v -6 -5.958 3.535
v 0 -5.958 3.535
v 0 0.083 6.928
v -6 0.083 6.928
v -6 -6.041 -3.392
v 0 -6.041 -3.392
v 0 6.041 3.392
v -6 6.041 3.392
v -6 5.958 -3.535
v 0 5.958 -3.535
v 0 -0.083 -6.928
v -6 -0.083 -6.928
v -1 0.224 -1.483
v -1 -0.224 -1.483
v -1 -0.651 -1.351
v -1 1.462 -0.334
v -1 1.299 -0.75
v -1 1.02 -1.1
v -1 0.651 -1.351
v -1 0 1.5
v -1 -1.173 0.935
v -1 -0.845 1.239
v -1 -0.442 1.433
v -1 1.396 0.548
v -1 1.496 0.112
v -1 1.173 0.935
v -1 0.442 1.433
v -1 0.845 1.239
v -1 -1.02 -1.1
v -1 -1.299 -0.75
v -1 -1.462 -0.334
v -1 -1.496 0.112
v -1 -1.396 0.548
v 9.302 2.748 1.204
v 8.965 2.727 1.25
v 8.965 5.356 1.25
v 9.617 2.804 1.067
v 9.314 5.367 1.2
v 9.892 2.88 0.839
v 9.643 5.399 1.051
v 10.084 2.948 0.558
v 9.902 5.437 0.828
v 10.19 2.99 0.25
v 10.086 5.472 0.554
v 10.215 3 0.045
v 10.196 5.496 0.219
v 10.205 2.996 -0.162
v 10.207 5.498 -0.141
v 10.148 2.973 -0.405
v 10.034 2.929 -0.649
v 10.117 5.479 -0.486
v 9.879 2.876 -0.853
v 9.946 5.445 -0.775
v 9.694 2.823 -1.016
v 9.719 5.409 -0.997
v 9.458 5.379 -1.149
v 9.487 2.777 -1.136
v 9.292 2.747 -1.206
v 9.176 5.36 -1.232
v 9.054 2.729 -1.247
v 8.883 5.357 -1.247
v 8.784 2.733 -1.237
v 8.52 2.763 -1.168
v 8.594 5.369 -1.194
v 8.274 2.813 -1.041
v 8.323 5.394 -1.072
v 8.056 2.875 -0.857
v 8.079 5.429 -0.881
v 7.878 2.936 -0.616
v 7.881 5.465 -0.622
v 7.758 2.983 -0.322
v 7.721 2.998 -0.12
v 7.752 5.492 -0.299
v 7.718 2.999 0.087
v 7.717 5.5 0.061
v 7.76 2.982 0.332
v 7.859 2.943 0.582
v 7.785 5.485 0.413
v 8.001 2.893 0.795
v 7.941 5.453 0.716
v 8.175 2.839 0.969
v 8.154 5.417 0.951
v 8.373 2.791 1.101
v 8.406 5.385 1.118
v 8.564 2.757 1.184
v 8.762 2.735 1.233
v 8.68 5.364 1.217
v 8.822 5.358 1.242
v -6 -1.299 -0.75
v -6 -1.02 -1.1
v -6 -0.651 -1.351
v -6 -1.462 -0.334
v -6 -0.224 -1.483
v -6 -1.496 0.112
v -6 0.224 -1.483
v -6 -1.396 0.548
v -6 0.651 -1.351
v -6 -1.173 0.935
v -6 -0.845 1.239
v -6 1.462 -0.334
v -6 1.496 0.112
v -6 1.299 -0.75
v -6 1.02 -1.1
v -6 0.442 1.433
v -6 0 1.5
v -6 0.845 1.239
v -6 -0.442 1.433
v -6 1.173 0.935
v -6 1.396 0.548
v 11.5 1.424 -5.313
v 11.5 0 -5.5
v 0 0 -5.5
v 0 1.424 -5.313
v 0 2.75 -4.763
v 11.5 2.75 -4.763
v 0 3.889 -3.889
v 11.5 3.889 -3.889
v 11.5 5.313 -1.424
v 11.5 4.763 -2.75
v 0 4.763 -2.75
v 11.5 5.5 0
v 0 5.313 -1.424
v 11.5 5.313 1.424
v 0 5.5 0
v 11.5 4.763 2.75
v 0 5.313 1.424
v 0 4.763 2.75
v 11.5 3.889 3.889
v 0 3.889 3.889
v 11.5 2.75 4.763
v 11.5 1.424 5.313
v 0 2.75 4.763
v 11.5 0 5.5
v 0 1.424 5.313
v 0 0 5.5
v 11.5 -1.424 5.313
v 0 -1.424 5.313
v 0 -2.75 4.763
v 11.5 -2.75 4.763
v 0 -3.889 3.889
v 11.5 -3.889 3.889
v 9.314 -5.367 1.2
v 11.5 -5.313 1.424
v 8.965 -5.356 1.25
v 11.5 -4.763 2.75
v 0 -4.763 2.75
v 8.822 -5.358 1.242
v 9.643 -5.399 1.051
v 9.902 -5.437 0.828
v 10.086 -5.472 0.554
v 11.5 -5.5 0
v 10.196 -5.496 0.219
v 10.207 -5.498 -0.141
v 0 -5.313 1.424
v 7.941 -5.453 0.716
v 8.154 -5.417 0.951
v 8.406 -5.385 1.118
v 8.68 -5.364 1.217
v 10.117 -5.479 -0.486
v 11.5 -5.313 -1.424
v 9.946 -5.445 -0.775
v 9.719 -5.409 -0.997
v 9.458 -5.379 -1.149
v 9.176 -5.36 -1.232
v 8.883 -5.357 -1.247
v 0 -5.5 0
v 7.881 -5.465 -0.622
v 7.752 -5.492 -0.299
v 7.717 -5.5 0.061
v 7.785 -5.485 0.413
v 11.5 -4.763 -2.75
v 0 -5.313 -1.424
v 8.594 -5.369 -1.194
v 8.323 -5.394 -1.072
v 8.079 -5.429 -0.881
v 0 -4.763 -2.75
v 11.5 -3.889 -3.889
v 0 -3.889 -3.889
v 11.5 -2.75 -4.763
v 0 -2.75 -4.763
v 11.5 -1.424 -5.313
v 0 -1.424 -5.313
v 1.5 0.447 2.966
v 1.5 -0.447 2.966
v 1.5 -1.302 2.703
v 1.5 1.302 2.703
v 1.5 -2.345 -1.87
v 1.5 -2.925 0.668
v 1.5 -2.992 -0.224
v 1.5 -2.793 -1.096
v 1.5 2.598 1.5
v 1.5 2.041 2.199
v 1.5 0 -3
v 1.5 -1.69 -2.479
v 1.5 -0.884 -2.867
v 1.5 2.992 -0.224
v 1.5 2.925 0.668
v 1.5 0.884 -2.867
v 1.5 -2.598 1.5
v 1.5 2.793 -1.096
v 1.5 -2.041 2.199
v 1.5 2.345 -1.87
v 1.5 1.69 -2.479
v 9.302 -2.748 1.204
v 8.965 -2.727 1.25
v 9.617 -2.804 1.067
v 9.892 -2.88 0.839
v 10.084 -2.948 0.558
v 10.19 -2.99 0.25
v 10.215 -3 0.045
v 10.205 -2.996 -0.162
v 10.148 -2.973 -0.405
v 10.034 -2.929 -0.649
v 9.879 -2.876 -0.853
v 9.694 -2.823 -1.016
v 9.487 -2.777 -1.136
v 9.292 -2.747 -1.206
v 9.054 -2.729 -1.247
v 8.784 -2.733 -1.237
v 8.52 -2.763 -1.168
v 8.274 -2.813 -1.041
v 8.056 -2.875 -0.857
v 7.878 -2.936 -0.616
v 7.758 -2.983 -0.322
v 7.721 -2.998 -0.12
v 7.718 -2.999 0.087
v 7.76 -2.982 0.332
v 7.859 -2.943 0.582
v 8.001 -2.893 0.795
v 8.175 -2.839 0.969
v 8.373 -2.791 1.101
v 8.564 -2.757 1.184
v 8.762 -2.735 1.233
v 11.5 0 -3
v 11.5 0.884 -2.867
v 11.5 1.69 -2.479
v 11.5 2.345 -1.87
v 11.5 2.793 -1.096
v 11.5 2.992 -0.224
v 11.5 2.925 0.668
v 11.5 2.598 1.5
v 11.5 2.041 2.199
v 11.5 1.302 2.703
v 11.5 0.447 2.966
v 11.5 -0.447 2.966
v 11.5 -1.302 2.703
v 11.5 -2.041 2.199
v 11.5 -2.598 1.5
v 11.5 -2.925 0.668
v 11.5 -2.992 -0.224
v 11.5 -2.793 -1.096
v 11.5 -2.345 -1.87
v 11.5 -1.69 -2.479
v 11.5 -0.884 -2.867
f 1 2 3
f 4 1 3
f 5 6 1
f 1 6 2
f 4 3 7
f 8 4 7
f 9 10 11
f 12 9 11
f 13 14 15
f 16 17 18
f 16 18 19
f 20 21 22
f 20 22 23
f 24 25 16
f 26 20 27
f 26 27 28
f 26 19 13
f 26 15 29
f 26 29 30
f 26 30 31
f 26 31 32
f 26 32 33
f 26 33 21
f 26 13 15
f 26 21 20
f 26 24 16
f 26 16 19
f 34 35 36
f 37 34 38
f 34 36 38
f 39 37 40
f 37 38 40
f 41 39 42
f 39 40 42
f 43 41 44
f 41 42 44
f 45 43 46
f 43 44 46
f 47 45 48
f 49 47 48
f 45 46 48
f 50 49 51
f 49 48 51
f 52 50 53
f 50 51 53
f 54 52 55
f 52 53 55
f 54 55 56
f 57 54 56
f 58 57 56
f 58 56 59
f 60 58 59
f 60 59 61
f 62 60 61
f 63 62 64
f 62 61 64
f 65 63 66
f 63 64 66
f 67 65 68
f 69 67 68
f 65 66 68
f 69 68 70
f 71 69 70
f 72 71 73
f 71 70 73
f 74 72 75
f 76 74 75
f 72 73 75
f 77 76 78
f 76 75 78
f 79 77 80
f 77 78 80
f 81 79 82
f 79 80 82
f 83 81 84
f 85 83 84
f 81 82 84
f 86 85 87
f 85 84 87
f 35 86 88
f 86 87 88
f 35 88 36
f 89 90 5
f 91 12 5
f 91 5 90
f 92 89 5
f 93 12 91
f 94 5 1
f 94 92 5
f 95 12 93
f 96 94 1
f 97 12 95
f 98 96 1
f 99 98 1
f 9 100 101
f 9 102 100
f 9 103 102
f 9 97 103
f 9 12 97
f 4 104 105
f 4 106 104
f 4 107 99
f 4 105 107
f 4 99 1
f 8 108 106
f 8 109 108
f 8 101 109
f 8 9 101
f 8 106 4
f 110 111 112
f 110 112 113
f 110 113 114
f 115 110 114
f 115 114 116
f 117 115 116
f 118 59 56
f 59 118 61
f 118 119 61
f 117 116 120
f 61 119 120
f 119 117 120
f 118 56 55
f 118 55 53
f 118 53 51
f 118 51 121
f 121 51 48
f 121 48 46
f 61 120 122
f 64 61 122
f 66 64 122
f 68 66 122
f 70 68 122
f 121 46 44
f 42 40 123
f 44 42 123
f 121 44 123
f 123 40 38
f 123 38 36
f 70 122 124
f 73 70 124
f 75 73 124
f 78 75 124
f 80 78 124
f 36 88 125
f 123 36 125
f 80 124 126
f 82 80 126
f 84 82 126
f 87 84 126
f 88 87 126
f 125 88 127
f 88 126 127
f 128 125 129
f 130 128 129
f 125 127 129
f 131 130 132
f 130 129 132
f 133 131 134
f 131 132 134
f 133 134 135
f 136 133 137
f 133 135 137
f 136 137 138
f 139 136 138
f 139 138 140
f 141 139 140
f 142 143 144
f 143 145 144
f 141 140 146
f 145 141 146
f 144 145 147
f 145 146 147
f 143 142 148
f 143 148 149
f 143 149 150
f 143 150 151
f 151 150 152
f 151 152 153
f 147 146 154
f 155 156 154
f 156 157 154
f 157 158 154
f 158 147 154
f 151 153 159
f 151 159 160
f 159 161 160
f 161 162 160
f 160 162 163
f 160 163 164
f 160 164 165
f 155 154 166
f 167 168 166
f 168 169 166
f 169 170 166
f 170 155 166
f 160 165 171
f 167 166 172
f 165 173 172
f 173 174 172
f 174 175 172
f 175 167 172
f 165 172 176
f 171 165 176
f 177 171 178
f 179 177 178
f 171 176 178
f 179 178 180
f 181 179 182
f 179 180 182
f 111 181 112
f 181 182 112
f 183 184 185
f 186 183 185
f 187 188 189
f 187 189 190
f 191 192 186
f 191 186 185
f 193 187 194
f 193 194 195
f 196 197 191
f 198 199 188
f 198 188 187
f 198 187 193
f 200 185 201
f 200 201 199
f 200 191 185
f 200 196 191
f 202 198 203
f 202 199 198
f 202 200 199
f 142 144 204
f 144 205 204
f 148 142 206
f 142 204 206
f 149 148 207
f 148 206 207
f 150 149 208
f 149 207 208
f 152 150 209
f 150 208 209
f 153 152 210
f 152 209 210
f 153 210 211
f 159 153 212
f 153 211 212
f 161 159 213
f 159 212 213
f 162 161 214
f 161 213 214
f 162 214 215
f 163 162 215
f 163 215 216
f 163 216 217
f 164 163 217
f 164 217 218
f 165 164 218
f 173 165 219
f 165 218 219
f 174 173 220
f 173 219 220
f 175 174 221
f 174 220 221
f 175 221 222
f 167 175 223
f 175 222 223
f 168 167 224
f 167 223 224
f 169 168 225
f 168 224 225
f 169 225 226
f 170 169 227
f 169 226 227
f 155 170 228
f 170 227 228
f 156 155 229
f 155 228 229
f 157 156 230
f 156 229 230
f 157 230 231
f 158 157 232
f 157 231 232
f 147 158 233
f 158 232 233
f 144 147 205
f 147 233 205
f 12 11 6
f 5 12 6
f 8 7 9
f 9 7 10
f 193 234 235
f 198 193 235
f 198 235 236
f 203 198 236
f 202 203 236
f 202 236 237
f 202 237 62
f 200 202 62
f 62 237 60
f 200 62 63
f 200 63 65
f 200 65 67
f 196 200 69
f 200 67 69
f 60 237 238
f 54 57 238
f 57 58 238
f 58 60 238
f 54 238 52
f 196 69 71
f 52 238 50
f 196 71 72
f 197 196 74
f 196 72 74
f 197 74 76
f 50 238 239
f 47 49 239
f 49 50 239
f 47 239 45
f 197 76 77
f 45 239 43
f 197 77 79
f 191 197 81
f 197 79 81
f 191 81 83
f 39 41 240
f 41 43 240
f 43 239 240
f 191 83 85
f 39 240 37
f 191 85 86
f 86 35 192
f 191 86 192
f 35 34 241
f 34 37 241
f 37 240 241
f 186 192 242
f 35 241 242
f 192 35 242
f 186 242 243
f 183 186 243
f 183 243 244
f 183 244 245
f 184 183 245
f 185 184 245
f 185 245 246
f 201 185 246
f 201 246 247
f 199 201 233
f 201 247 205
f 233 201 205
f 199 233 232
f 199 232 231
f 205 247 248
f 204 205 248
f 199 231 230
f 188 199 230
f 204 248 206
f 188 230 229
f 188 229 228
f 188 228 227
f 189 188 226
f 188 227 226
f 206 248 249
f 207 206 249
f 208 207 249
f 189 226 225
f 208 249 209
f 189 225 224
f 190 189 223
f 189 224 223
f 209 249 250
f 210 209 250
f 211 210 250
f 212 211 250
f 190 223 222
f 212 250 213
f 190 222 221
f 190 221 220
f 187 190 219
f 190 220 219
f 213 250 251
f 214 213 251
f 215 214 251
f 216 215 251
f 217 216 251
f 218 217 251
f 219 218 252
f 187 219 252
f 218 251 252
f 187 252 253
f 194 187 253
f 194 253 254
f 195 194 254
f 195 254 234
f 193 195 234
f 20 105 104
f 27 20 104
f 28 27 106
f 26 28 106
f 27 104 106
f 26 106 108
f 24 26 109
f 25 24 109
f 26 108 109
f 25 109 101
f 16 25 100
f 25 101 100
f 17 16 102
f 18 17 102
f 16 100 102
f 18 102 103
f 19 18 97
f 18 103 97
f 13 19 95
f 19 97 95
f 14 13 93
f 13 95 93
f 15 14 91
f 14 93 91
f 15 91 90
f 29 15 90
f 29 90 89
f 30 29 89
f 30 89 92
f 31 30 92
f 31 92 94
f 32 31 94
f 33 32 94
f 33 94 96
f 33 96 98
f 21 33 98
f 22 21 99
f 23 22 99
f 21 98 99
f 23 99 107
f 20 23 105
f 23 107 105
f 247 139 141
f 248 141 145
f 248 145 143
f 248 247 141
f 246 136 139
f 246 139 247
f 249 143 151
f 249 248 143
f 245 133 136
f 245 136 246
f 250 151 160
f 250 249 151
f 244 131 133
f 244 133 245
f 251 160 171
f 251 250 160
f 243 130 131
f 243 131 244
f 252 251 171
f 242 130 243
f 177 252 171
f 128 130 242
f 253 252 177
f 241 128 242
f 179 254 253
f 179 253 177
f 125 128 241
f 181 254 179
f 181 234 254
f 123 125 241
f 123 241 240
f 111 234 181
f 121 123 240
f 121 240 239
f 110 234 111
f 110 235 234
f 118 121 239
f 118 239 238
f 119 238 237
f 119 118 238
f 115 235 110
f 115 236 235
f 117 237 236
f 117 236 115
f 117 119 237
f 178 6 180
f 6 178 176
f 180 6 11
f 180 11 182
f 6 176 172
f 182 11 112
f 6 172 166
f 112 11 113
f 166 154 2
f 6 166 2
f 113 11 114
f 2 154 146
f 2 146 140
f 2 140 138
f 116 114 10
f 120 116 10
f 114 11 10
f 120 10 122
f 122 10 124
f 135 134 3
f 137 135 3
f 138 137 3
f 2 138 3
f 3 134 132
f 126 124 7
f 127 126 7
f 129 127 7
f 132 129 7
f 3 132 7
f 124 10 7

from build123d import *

# Parameters (mm, degrees)
SKETCH1_R           = 5.5
BOSS_EXTRUDE1_DEPTH = 11.5
BOSS_EXTRUDE2_DEPTH = 6
SKETCH3_R           = 3
CUT_EXTRUDE1_DEPTH  = 10
SKETCH4_R           = 1.25
CUT_EXTRUDE4_DEPTH  = 10
SKETCH5_R           = 1.5
CUT_EXTRUDE5_DEPTH  = 5


with BuildPart() as part:
    # Sketch1 → Boss-Extrude1 (new body)
    with BuildSketch(Plane(origin=(0, 0, 0), x_dir=(0, 0, -1), z_dir=(1, 0, 0))):
        Circle(SKETCH1_R)
    extrude(amount=BOSS_EXTRUDE1_DEPTH)

    # Sketch2 → Boss-Extrude2 (add)
    with BuildSketch(Plane.ZY):
        Polygon((3.392309556, 6.040880389), (-3.535401101, 5.958266447), (-6.927710656, -0.082613942), (-3.392309556, -6.040880389), (3.535401101, -5.958266447), (6.927710656, 0.082613942), align=None)
    extrude(amount=BOSS_EXTRUDE2_DEPTH)

    # Sketch3 → Cut-Extrude1 (cut)
    with BuildSketch(Plane(origin=(11.5, 0, 0), x_dir=(0, 0, -1), z_dir=(1, 0, 0))):
        Circle(SKETCH3_R)
    extrude(amount=-CUT_EXTRUDE1_DEPTH, mode=Mode.SUBTRACT)

    # Sketch4 → Cut-Extrude4 (cut, symmetric)
    with BuildSketch(Plane(origin=(0, 0, 0), x_dir=(1, 0, 0), z_dir=(0, 1, 0))):
        with Locations(Location((8.965402785, 0, 0), (0, 0, 270))):
            Circle(SKETCH4_R)
    extrude(amount=CUT_EXTRUDE4_DEPTH, both=True, mode=Mode.SUBTRACT)

    # Sketch5 → Cut-Extrude5 (cut)
    with BuildSketch(Plane.ZY.offset(6)):
        Circle(SKETCH5_R)
    extrude(amount=-CUT_EXTRUDE5_DEPTH, mode=Mode.SUBTRACT)


solid = part.part
